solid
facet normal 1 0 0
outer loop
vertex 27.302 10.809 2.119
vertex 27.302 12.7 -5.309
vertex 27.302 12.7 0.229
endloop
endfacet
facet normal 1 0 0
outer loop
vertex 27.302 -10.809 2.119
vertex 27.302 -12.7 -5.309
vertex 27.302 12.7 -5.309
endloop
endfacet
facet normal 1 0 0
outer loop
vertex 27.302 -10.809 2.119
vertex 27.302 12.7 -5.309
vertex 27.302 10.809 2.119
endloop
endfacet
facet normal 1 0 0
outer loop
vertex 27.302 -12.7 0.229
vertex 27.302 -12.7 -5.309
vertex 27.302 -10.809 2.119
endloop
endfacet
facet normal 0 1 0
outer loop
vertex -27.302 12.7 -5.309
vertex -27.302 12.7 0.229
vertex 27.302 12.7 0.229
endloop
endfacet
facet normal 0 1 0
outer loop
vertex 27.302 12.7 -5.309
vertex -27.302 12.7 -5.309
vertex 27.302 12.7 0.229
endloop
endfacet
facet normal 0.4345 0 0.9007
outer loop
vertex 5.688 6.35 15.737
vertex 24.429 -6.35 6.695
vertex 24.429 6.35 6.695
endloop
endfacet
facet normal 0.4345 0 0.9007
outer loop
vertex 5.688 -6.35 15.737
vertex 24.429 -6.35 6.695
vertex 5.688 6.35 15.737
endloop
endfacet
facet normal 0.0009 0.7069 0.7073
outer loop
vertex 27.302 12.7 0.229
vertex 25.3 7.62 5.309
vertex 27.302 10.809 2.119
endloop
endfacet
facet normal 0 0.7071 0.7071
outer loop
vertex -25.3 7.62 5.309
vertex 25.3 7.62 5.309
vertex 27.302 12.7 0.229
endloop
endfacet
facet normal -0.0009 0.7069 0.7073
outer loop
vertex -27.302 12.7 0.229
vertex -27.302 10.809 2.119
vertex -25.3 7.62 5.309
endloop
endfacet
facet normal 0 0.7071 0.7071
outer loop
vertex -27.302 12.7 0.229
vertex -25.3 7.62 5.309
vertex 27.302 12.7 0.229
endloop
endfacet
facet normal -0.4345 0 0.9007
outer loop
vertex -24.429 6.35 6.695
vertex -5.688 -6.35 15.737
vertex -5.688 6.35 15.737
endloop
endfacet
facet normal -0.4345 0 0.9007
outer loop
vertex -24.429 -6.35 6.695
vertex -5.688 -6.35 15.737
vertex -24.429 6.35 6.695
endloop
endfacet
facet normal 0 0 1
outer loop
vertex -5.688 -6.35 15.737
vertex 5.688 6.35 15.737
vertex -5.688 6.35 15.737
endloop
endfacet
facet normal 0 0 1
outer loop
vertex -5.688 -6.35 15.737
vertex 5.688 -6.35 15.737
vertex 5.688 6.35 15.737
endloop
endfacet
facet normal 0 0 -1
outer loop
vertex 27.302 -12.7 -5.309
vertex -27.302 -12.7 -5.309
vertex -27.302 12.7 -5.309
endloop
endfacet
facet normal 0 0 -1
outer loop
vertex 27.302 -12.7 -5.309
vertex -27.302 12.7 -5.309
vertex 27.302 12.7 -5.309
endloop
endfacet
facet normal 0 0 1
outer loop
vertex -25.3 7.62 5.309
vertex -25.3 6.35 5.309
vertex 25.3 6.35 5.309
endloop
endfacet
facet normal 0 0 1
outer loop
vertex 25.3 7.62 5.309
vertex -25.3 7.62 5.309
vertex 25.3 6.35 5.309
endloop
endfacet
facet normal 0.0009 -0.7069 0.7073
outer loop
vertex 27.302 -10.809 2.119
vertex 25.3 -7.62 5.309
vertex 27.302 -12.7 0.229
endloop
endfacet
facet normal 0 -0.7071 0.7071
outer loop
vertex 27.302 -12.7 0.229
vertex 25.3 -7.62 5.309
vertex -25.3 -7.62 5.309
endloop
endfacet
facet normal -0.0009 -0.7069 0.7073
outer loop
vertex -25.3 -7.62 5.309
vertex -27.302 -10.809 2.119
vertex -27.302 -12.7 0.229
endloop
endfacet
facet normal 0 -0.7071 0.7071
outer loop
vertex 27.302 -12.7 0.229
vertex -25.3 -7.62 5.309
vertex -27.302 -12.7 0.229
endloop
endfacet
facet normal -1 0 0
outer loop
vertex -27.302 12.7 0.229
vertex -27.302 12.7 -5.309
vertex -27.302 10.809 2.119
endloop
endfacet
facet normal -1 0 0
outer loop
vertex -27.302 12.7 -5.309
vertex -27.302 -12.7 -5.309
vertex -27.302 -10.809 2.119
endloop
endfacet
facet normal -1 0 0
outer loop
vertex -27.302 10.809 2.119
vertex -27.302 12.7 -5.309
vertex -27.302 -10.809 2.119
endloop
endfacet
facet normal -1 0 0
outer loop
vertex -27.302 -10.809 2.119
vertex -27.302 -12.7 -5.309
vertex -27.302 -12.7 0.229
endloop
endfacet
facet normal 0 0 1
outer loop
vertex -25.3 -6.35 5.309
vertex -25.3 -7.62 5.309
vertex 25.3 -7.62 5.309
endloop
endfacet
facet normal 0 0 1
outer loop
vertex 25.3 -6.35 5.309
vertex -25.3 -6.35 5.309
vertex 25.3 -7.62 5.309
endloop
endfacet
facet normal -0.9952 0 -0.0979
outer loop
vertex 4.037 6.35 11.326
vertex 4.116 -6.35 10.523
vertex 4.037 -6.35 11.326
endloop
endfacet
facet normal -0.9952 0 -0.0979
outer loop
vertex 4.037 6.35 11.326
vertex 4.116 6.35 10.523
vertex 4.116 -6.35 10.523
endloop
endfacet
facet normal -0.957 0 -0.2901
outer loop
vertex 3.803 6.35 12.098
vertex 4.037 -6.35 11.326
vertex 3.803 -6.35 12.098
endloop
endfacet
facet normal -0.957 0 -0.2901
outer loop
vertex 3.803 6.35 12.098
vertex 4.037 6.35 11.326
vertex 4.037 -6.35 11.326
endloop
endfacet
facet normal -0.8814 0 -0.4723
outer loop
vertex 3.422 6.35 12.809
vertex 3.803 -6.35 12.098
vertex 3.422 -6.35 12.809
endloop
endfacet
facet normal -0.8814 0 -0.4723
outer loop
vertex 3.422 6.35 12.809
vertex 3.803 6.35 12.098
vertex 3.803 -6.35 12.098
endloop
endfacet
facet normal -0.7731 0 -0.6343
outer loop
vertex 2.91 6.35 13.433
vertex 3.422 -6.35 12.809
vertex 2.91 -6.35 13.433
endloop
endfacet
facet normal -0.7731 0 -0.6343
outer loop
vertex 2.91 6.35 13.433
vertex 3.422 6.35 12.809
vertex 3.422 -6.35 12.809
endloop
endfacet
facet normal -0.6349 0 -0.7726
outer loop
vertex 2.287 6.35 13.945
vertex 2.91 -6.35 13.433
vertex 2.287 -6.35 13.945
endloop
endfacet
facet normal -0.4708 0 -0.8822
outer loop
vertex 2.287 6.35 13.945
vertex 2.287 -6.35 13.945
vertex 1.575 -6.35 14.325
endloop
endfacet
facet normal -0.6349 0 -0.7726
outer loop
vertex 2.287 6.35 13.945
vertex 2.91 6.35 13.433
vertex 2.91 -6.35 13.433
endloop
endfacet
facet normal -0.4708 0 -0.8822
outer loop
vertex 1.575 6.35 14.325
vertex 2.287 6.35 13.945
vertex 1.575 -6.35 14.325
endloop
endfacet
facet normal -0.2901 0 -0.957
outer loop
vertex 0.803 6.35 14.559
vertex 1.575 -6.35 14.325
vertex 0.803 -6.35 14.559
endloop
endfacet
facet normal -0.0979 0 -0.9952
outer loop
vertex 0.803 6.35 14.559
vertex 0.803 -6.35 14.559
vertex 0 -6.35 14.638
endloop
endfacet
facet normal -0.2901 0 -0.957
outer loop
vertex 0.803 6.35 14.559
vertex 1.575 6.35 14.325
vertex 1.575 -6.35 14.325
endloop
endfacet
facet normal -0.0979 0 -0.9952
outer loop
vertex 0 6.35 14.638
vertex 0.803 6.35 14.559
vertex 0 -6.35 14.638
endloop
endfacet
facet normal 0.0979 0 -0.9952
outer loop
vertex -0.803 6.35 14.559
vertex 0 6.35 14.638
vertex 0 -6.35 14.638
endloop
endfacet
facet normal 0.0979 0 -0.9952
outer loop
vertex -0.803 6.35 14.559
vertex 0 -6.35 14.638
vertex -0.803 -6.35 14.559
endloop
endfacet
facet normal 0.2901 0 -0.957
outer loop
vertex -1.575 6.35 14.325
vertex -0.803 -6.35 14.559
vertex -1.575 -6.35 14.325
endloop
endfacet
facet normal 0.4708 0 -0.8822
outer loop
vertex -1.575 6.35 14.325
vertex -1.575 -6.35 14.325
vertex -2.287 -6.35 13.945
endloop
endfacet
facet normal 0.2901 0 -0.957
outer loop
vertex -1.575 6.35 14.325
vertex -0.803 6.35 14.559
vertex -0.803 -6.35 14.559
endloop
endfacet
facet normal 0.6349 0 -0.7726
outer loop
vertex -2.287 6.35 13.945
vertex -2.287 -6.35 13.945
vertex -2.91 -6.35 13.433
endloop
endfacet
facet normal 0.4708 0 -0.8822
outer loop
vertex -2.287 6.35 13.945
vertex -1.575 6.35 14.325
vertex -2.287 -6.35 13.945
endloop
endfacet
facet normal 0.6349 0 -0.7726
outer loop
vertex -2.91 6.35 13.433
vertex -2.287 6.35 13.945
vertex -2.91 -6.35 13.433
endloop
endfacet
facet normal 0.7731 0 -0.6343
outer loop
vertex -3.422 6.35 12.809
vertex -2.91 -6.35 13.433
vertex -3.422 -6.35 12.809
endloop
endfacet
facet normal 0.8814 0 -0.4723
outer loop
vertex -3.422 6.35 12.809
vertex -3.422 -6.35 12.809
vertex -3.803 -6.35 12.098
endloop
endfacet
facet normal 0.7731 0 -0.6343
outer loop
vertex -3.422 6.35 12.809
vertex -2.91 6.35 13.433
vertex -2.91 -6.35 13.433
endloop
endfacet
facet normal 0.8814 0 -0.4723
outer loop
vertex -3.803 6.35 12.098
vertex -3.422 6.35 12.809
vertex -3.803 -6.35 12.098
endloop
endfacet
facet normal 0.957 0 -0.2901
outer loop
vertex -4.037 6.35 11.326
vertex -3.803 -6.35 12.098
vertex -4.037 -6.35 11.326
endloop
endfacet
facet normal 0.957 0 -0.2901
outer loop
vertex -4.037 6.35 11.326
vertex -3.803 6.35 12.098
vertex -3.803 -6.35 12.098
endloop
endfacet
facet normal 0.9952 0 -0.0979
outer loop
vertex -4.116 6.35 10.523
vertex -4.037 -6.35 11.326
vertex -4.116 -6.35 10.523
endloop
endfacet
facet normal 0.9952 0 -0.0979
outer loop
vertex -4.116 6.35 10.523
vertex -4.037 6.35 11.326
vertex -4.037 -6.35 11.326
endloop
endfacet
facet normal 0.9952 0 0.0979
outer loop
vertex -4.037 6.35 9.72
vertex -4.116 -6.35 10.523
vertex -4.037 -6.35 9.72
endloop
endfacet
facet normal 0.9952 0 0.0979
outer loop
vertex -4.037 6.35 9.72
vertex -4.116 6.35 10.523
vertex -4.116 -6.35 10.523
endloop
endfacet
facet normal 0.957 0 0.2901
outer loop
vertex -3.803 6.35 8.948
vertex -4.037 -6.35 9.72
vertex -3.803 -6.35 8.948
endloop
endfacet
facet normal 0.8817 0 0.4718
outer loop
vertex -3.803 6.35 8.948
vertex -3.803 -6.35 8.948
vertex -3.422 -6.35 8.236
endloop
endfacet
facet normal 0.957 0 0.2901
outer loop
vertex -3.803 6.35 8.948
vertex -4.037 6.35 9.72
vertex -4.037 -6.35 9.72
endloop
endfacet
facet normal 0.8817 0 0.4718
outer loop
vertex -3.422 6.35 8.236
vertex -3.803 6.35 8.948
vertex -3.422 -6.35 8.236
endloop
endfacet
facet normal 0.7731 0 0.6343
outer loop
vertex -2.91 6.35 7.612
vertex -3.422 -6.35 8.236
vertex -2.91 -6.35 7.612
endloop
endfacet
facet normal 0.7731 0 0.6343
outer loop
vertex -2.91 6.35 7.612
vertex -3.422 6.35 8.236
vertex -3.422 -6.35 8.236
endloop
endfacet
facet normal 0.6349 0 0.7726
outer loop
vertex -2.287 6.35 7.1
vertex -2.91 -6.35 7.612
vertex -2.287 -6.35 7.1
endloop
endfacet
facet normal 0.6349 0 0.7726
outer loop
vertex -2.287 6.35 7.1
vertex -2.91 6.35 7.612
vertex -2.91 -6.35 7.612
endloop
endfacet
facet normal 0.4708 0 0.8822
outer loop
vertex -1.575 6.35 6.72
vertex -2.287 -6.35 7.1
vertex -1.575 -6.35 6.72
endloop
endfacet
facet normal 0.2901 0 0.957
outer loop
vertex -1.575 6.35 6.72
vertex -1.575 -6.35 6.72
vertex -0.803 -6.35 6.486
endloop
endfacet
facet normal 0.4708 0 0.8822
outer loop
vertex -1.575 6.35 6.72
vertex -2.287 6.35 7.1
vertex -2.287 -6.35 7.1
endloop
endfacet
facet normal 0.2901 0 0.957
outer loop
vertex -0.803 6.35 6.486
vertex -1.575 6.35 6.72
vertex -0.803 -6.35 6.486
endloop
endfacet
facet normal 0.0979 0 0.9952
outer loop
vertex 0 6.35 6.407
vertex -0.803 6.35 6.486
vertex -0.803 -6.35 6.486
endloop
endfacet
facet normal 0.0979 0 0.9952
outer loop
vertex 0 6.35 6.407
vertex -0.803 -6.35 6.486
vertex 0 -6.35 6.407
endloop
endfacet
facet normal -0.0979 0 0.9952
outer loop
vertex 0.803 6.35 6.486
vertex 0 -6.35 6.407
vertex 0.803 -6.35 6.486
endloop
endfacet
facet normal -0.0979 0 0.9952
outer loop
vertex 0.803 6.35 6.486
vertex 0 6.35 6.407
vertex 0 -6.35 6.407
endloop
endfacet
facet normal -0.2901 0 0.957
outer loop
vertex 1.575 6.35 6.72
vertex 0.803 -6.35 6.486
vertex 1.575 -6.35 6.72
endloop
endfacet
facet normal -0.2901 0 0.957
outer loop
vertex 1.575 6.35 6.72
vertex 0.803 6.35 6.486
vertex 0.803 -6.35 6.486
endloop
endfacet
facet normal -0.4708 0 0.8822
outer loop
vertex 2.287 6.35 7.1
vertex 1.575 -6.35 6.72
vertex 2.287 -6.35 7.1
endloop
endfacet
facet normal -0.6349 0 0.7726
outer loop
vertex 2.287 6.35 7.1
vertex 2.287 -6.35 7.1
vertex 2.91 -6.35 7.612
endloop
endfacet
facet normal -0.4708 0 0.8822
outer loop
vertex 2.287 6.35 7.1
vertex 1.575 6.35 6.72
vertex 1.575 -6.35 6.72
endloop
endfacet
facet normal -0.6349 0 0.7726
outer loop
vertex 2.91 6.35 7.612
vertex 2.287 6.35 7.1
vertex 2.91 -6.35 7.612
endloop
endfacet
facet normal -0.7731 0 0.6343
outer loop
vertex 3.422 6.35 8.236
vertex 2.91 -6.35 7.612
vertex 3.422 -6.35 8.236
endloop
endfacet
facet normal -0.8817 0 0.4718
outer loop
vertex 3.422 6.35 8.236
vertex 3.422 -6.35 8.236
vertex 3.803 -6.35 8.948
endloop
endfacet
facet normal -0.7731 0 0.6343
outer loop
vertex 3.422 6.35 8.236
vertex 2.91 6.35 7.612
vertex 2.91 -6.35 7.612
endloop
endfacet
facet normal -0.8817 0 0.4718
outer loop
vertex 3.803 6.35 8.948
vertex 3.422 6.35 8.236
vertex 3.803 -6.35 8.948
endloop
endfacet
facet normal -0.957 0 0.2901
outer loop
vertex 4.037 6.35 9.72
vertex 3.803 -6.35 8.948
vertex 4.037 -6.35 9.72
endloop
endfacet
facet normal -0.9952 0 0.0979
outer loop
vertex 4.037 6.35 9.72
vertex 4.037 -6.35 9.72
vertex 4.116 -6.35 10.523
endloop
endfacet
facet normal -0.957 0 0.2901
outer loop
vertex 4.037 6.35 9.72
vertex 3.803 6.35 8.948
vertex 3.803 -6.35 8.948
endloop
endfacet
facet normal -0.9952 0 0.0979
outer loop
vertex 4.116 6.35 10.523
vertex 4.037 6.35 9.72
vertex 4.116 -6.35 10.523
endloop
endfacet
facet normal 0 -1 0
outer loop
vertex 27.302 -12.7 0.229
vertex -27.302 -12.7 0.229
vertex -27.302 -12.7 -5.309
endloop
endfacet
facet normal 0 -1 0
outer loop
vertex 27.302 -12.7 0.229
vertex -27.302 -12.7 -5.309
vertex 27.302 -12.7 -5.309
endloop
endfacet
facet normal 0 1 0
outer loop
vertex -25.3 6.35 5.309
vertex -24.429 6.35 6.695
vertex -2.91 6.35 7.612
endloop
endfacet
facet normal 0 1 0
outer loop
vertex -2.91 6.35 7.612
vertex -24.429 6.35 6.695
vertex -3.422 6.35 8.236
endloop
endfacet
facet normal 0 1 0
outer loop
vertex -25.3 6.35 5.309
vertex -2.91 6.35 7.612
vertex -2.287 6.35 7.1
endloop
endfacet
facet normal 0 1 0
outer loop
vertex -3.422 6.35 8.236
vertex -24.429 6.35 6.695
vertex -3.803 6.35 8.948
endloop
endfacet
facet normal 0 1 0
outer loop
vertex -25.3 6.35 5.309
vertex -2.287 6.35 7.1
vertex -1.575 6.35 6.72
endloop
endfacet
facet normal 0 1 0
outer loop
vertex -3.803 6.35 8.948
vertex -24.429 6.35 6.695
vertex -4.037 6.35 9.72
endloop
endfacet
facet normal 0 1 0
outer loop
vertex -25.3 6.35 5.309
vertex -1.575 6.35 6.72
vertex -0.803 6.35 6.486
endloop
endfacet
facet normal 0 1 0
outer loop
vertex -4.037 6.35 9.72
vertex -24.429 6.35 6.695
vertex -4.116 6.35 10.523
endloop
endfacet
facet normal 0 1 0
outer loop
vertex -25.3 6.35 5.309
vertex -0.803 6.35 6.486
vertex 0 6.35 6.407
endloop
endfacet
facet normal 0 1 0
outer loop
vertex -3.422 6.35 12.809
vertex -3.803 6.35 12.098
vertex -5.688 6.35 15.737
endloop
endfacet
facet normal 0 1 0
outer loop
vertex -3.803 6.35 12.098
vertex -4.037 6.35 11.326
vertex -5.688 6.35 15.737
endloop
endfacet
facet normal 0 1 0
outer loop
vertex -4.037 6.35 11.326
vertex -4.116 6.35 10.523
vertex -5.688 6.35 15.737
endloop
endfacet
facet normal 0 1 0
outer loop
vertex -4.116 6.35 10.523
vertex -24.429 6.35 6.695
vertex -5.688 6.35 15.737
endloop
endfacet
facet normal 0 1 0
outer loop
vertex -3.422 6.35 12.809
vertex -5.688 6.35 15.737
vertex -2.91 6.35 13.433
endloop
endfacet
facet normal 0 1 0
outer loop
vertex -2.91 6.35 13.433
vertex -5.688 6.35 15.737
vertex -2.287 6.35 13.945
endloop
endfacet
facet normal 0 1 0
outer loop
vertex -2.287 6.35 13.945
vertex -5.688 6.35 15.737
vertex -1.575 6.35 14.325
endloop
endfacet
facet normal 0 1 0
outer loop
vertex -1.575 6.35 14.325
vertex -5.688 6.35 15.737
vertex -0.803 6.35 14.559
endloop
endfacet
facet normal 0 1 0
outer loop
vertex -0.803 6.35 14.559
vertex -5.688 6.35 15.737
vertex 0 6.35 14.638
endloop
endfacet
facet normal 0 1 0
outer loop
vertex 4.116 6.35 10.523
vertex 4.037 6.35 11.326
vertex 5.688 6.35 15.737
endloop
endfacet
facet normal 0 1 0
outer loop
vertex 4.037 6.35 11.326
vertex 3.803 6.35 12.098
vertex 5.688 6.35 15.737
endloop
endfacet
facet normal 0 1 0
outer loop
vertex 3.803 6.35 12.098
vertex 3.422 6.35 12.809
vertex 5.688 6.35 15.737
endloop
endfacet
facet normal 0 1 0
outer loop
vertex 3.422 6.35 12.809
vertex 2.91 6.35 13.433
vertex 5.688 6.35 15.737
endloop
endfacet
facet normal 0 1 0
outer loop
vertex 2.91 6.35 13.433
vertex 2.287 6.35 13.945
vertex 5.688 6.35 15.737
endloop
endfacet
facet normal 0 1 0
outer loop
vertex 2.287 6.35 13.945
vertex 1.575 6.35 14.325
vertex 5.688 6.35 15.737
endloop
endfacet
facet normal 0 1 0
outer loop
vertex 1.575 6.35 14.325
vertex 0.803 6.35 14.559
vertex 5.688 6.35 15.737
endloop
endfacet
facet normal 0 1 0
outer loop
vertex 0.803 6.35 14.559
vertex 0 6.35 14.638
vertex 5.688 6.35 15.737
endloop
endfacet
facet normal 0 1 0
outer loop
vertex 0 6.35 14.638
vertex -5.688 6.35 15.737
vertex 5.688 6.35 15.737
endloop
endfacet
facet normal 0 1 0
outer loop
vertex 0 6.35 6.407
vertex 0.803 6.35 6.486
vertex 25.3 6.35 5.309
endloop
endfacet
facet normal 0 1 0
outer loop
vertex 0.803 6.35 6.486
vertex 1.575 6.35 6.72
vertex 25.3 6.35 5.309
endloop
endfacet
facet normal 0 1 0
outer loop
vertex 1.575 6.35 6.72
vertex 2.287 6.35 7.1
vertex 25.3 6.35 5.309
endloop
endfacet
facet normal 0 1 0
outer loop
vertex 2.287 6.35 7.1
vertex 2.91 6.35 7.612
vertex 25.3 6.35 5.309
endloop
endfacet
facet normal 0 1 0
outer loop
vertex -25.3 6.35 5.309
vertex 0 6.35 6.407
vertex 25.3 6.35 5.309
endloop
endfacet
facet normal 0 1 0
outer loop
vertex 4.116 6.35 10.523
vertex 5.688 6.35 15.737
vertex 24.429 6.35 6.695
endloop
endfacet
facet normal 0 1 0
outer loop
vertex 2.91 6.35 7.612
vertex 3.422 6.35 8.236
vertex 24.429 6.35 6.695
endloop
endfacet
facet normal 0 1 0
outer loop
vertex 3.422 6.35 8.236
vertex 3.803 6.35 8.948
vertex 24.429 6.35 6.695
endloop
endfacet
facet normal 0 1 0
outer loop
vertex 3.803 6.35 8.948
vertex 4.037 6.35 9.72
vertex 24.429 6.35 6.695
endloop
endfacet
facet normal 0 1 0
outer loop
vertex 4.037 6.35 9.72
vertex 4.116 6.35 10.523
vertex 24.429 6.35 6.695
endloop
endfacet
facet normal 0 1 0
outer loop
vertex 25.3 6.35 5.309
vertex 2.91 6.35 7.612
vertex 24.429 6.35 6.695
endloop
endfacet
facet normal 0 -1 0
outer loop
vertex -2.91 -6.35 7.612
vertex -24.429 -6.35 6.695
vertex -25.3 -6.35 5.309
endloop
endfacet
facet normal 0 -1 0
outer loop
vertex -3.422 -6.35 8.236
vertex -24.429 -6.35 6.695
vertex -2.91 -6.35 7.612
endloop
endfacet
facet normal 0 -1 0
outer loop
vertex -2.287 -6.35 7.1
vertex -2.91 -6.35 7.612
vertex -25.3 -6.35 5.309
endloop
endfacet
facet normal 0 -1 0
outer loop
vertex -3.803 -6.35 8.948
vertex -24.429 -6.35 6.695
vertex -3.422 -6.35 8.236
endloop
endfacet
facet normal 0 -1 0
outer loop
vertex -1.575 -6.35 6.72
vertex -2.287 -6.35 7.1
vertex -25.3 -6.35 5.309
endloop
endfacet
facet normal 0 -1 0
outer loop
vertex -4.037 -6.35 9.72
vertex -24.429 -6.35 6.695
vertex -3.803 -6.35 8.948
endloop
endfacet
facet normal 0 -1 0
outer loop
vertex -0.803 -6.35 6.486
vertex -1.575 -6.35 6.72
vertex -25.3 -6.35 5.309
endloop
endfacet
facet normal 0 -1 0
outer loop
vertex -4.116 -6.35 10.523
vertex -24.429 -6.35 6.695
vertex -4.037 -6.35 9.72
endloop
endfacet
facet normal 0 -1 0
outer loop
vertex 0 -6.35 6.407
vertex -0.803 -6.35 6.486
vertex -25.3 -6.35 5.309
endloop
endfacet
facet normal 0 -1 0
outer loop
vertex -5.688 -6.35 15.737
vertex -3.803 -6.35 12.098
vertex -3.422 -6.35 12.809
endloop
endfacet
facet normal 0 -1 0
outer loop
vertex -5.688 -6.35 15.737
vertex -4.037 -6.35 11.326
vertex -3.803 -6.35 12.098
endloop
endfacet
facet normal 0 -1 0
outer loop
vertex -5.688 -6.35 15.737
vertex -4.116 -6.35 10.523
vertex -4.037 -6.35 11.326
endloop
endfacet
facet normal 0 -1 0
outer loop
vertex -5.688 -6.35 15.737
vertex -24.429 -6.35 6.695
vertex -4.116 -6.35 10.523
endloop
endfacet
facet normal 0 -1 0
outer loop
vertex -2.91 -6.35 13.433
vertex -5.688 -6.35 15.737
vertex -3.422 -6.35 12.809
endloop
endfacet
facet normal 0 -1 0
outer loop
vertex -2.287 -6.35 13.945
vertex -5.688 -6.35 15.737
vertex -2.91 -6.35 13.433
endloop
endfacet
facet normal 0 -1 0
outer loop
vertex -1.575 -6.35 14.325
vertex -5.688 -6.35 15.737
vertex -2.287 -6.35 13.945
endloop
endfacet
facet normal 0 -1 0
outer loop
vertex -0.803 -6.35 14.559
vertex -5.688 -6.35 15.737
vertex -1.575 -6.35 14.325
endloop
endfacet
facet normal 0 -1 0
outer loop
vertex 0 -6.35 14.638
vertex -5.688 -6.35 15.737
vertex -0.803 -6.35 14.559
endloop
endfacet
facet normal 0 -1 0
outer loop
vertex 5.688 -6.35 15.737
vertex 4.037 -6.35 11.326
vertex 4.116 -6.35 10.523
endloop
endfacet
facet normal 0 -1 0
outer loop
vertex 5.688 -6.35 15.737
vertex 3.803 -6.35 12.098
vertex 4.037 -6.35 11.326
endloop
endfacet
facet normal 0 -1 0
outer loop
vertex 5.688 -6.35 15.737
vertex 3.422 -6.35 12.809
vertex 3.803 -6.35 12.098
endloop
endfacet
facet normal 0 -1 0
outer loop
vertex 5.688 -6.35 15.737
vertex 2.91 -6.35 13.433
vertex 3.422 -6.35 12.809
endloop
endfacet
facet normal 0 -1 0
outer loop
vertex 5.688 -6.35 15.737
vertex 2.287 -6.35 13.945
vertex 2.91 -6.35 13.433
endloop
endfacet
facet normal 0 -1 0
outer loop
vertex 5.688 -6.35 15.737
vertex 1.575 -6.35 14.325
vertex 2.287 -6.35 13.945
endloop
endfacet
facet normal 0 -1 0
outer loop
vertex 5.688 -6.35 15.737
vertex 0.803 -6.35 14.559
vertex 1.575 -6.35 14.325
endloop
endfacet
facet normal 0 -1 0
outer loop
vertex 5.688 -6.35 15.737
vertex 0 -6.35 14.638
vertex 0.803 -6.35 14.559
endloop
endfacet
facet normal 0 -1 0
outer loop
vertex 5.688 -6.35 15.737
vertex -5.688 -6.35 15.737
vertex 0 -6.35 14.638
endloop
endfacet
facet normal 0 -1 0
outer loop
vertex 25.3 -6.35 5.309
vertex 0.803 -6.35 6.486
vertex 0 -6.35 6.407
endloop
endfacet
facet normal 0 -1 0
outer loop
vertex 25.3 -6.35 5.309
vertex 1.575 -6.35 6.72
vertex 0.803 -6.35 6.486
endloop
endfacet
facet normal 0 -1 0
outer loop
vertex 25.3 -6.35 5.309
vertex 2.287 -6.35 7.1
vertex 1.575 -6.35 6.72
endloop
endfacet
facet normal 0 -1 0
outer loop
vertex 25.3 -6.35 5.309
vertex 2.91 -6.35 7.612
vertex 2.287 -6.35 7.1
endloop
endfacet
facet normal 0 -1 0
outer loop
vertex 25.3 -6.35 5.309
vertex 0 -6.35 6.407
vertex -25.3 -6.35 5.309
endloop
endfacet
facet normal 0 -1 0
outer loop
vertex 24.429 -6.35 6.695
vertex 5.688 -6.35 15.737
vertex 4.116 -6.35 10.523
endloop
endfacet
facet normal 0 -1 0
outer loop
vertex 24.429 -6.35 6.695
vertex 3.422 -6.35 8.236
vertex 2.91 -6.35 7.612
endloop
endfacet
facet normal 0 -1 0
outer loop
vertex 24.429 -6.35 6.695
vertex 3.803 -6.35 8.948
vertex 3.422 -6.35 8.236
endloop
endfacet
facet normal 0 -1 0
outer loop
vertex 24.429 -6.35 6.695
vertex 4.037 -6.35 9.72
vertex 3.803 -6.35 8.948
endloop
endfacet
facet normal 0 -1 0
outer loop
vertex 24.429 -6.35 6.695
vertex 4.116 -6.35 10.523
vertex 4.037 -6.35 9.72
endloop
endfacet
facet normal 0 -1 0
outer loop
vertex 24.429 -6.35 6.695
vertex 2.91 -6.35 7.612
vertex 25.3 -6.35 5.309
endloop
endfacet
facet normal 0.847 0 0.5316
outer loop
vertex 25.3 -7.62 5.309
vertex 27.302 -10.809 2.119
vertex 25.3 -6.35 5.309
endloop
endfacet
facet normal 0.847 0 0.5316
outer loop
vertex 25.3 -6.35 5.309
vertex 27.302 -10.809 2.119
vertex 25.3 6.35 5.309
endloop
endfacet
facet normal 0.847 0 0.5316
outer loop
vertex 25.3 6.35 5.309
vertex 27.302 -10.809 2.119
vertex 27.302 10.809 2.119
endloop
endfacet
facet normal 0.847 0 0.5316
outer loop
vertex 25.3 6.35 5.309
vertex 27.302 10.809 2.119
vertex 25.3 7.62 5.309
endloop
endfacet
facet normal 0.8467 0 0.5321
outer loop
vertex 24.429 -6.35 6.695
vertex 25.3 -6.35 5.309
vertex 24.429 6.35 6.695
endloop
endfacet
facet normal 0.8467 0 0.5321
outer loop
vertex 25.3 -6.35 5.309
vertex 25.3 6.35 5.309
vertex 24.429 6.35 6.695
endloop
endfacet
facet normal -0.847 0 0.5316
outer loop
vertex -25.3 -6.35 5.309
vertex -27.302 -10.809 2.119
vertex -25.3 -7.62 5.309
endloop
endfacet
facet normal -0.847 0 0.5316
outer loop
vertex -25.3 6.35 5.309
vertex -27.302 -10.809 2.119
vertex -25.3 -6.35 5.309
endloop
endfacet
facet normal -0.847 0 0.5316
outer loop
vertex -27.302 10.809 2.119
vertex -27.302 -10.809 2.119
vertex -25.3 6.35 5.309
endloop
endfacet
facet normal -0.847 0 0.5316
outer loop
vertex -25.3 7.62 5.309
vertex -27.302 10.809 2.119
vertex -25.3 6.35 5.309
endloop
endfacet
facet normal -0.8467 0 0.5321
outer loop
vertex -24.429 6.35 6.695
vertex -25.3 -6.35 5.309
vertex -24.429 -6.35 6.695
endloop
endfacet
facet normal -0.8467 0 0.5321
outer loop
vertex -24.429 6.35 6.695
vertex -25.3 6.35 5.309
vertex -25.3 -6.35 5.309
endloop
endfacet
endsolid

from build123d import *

# Parameters (mm, degrees)
F0_R        = 4.1158301742
F1_DEPTH    = 6.35
F0_W        = 54.6039827168
F0_H        = 10.6174414977
F2_DEPTH    = 12.7
F3_T1_DEPTH = 80.7322818745
F3_T3_DEPTH = 29.5163540068
F3_T5_DEPTH = 29.5163538598


# Not quite as in the source:
# - a fillet or chamfer that OpenCascade refuses, or shapes differently, is made with other operations: its cross-section is extruded or revolved along the edge and cut away or added


with BuildPart() as f1:
    # F0 (on Front) → F1 (new body, symmetric)
    with BuildSketch(Plane.XZ):
        Polygon((-5.6879152544, 15.7365649939), (-27.3019913584, 5.3087207489), (27.3019913584, 5.3087207489), (5.68791572, 15.7365649939), (0, 15.7365649939), align=None)
        with Locations((0, 10.5226428714)):
            Circle(F0_R, mode=Mode.SUBTRACT)
    extrude(amount=F1_DEPTH, both=True)

    # F0 (on Front) → F2 (join, symmetric)
    with BuildSketch(Plane.XZ):
        Rectangle(F0_W, F0_H)
    extrude(amount=F2_DEPTH, both=True)

    # F3: chamfer of 5.08 on 4 edges, made by hand

    # F3_s2 → F3_t1 (cut)
    with BuildSketch(Plane.YZ.offset(-40.3661409373)):
        Polygon((-7.62, 5.3087207489), (-12.7, 0.2287207489), (-12.7, 5.3087207489), align=None)
        Polygon((7.62, 5.3087207489), (12.7, 0.2287207489), (12.7, 5.3087207489), align=None)
    extrude(amount=F3_T1_DEPTH, mode=Mode.SUBTRACT)

    # F3_s4 → F3_t3 (cut)
    with BuildSketch(Plane.XZ.offset(-14.7581770034)):
        Polygon((-27.3019913584, 2.1192789571), (-24.4293942586, 6.6946229263), (-27.3019913584, 5.3087207489), align=None)
    extrude(amount=F3_T3_DEPTH, mode=Mode.SUBTRACT)

    # F3_s6 → F3_t5 (cut)
    with BuildSketch(Plane.XZ.offset(-14.7581769299)):
        Polygon((27.3019913584, 2.119278987), (24.4293942972, 6.6946229375), (27.3019913584, 5.3087207489), align=None)
    extrude(amount=F3_T5_DEPTH, mode=Mode.SUBTRACT)


solid = f1.part
